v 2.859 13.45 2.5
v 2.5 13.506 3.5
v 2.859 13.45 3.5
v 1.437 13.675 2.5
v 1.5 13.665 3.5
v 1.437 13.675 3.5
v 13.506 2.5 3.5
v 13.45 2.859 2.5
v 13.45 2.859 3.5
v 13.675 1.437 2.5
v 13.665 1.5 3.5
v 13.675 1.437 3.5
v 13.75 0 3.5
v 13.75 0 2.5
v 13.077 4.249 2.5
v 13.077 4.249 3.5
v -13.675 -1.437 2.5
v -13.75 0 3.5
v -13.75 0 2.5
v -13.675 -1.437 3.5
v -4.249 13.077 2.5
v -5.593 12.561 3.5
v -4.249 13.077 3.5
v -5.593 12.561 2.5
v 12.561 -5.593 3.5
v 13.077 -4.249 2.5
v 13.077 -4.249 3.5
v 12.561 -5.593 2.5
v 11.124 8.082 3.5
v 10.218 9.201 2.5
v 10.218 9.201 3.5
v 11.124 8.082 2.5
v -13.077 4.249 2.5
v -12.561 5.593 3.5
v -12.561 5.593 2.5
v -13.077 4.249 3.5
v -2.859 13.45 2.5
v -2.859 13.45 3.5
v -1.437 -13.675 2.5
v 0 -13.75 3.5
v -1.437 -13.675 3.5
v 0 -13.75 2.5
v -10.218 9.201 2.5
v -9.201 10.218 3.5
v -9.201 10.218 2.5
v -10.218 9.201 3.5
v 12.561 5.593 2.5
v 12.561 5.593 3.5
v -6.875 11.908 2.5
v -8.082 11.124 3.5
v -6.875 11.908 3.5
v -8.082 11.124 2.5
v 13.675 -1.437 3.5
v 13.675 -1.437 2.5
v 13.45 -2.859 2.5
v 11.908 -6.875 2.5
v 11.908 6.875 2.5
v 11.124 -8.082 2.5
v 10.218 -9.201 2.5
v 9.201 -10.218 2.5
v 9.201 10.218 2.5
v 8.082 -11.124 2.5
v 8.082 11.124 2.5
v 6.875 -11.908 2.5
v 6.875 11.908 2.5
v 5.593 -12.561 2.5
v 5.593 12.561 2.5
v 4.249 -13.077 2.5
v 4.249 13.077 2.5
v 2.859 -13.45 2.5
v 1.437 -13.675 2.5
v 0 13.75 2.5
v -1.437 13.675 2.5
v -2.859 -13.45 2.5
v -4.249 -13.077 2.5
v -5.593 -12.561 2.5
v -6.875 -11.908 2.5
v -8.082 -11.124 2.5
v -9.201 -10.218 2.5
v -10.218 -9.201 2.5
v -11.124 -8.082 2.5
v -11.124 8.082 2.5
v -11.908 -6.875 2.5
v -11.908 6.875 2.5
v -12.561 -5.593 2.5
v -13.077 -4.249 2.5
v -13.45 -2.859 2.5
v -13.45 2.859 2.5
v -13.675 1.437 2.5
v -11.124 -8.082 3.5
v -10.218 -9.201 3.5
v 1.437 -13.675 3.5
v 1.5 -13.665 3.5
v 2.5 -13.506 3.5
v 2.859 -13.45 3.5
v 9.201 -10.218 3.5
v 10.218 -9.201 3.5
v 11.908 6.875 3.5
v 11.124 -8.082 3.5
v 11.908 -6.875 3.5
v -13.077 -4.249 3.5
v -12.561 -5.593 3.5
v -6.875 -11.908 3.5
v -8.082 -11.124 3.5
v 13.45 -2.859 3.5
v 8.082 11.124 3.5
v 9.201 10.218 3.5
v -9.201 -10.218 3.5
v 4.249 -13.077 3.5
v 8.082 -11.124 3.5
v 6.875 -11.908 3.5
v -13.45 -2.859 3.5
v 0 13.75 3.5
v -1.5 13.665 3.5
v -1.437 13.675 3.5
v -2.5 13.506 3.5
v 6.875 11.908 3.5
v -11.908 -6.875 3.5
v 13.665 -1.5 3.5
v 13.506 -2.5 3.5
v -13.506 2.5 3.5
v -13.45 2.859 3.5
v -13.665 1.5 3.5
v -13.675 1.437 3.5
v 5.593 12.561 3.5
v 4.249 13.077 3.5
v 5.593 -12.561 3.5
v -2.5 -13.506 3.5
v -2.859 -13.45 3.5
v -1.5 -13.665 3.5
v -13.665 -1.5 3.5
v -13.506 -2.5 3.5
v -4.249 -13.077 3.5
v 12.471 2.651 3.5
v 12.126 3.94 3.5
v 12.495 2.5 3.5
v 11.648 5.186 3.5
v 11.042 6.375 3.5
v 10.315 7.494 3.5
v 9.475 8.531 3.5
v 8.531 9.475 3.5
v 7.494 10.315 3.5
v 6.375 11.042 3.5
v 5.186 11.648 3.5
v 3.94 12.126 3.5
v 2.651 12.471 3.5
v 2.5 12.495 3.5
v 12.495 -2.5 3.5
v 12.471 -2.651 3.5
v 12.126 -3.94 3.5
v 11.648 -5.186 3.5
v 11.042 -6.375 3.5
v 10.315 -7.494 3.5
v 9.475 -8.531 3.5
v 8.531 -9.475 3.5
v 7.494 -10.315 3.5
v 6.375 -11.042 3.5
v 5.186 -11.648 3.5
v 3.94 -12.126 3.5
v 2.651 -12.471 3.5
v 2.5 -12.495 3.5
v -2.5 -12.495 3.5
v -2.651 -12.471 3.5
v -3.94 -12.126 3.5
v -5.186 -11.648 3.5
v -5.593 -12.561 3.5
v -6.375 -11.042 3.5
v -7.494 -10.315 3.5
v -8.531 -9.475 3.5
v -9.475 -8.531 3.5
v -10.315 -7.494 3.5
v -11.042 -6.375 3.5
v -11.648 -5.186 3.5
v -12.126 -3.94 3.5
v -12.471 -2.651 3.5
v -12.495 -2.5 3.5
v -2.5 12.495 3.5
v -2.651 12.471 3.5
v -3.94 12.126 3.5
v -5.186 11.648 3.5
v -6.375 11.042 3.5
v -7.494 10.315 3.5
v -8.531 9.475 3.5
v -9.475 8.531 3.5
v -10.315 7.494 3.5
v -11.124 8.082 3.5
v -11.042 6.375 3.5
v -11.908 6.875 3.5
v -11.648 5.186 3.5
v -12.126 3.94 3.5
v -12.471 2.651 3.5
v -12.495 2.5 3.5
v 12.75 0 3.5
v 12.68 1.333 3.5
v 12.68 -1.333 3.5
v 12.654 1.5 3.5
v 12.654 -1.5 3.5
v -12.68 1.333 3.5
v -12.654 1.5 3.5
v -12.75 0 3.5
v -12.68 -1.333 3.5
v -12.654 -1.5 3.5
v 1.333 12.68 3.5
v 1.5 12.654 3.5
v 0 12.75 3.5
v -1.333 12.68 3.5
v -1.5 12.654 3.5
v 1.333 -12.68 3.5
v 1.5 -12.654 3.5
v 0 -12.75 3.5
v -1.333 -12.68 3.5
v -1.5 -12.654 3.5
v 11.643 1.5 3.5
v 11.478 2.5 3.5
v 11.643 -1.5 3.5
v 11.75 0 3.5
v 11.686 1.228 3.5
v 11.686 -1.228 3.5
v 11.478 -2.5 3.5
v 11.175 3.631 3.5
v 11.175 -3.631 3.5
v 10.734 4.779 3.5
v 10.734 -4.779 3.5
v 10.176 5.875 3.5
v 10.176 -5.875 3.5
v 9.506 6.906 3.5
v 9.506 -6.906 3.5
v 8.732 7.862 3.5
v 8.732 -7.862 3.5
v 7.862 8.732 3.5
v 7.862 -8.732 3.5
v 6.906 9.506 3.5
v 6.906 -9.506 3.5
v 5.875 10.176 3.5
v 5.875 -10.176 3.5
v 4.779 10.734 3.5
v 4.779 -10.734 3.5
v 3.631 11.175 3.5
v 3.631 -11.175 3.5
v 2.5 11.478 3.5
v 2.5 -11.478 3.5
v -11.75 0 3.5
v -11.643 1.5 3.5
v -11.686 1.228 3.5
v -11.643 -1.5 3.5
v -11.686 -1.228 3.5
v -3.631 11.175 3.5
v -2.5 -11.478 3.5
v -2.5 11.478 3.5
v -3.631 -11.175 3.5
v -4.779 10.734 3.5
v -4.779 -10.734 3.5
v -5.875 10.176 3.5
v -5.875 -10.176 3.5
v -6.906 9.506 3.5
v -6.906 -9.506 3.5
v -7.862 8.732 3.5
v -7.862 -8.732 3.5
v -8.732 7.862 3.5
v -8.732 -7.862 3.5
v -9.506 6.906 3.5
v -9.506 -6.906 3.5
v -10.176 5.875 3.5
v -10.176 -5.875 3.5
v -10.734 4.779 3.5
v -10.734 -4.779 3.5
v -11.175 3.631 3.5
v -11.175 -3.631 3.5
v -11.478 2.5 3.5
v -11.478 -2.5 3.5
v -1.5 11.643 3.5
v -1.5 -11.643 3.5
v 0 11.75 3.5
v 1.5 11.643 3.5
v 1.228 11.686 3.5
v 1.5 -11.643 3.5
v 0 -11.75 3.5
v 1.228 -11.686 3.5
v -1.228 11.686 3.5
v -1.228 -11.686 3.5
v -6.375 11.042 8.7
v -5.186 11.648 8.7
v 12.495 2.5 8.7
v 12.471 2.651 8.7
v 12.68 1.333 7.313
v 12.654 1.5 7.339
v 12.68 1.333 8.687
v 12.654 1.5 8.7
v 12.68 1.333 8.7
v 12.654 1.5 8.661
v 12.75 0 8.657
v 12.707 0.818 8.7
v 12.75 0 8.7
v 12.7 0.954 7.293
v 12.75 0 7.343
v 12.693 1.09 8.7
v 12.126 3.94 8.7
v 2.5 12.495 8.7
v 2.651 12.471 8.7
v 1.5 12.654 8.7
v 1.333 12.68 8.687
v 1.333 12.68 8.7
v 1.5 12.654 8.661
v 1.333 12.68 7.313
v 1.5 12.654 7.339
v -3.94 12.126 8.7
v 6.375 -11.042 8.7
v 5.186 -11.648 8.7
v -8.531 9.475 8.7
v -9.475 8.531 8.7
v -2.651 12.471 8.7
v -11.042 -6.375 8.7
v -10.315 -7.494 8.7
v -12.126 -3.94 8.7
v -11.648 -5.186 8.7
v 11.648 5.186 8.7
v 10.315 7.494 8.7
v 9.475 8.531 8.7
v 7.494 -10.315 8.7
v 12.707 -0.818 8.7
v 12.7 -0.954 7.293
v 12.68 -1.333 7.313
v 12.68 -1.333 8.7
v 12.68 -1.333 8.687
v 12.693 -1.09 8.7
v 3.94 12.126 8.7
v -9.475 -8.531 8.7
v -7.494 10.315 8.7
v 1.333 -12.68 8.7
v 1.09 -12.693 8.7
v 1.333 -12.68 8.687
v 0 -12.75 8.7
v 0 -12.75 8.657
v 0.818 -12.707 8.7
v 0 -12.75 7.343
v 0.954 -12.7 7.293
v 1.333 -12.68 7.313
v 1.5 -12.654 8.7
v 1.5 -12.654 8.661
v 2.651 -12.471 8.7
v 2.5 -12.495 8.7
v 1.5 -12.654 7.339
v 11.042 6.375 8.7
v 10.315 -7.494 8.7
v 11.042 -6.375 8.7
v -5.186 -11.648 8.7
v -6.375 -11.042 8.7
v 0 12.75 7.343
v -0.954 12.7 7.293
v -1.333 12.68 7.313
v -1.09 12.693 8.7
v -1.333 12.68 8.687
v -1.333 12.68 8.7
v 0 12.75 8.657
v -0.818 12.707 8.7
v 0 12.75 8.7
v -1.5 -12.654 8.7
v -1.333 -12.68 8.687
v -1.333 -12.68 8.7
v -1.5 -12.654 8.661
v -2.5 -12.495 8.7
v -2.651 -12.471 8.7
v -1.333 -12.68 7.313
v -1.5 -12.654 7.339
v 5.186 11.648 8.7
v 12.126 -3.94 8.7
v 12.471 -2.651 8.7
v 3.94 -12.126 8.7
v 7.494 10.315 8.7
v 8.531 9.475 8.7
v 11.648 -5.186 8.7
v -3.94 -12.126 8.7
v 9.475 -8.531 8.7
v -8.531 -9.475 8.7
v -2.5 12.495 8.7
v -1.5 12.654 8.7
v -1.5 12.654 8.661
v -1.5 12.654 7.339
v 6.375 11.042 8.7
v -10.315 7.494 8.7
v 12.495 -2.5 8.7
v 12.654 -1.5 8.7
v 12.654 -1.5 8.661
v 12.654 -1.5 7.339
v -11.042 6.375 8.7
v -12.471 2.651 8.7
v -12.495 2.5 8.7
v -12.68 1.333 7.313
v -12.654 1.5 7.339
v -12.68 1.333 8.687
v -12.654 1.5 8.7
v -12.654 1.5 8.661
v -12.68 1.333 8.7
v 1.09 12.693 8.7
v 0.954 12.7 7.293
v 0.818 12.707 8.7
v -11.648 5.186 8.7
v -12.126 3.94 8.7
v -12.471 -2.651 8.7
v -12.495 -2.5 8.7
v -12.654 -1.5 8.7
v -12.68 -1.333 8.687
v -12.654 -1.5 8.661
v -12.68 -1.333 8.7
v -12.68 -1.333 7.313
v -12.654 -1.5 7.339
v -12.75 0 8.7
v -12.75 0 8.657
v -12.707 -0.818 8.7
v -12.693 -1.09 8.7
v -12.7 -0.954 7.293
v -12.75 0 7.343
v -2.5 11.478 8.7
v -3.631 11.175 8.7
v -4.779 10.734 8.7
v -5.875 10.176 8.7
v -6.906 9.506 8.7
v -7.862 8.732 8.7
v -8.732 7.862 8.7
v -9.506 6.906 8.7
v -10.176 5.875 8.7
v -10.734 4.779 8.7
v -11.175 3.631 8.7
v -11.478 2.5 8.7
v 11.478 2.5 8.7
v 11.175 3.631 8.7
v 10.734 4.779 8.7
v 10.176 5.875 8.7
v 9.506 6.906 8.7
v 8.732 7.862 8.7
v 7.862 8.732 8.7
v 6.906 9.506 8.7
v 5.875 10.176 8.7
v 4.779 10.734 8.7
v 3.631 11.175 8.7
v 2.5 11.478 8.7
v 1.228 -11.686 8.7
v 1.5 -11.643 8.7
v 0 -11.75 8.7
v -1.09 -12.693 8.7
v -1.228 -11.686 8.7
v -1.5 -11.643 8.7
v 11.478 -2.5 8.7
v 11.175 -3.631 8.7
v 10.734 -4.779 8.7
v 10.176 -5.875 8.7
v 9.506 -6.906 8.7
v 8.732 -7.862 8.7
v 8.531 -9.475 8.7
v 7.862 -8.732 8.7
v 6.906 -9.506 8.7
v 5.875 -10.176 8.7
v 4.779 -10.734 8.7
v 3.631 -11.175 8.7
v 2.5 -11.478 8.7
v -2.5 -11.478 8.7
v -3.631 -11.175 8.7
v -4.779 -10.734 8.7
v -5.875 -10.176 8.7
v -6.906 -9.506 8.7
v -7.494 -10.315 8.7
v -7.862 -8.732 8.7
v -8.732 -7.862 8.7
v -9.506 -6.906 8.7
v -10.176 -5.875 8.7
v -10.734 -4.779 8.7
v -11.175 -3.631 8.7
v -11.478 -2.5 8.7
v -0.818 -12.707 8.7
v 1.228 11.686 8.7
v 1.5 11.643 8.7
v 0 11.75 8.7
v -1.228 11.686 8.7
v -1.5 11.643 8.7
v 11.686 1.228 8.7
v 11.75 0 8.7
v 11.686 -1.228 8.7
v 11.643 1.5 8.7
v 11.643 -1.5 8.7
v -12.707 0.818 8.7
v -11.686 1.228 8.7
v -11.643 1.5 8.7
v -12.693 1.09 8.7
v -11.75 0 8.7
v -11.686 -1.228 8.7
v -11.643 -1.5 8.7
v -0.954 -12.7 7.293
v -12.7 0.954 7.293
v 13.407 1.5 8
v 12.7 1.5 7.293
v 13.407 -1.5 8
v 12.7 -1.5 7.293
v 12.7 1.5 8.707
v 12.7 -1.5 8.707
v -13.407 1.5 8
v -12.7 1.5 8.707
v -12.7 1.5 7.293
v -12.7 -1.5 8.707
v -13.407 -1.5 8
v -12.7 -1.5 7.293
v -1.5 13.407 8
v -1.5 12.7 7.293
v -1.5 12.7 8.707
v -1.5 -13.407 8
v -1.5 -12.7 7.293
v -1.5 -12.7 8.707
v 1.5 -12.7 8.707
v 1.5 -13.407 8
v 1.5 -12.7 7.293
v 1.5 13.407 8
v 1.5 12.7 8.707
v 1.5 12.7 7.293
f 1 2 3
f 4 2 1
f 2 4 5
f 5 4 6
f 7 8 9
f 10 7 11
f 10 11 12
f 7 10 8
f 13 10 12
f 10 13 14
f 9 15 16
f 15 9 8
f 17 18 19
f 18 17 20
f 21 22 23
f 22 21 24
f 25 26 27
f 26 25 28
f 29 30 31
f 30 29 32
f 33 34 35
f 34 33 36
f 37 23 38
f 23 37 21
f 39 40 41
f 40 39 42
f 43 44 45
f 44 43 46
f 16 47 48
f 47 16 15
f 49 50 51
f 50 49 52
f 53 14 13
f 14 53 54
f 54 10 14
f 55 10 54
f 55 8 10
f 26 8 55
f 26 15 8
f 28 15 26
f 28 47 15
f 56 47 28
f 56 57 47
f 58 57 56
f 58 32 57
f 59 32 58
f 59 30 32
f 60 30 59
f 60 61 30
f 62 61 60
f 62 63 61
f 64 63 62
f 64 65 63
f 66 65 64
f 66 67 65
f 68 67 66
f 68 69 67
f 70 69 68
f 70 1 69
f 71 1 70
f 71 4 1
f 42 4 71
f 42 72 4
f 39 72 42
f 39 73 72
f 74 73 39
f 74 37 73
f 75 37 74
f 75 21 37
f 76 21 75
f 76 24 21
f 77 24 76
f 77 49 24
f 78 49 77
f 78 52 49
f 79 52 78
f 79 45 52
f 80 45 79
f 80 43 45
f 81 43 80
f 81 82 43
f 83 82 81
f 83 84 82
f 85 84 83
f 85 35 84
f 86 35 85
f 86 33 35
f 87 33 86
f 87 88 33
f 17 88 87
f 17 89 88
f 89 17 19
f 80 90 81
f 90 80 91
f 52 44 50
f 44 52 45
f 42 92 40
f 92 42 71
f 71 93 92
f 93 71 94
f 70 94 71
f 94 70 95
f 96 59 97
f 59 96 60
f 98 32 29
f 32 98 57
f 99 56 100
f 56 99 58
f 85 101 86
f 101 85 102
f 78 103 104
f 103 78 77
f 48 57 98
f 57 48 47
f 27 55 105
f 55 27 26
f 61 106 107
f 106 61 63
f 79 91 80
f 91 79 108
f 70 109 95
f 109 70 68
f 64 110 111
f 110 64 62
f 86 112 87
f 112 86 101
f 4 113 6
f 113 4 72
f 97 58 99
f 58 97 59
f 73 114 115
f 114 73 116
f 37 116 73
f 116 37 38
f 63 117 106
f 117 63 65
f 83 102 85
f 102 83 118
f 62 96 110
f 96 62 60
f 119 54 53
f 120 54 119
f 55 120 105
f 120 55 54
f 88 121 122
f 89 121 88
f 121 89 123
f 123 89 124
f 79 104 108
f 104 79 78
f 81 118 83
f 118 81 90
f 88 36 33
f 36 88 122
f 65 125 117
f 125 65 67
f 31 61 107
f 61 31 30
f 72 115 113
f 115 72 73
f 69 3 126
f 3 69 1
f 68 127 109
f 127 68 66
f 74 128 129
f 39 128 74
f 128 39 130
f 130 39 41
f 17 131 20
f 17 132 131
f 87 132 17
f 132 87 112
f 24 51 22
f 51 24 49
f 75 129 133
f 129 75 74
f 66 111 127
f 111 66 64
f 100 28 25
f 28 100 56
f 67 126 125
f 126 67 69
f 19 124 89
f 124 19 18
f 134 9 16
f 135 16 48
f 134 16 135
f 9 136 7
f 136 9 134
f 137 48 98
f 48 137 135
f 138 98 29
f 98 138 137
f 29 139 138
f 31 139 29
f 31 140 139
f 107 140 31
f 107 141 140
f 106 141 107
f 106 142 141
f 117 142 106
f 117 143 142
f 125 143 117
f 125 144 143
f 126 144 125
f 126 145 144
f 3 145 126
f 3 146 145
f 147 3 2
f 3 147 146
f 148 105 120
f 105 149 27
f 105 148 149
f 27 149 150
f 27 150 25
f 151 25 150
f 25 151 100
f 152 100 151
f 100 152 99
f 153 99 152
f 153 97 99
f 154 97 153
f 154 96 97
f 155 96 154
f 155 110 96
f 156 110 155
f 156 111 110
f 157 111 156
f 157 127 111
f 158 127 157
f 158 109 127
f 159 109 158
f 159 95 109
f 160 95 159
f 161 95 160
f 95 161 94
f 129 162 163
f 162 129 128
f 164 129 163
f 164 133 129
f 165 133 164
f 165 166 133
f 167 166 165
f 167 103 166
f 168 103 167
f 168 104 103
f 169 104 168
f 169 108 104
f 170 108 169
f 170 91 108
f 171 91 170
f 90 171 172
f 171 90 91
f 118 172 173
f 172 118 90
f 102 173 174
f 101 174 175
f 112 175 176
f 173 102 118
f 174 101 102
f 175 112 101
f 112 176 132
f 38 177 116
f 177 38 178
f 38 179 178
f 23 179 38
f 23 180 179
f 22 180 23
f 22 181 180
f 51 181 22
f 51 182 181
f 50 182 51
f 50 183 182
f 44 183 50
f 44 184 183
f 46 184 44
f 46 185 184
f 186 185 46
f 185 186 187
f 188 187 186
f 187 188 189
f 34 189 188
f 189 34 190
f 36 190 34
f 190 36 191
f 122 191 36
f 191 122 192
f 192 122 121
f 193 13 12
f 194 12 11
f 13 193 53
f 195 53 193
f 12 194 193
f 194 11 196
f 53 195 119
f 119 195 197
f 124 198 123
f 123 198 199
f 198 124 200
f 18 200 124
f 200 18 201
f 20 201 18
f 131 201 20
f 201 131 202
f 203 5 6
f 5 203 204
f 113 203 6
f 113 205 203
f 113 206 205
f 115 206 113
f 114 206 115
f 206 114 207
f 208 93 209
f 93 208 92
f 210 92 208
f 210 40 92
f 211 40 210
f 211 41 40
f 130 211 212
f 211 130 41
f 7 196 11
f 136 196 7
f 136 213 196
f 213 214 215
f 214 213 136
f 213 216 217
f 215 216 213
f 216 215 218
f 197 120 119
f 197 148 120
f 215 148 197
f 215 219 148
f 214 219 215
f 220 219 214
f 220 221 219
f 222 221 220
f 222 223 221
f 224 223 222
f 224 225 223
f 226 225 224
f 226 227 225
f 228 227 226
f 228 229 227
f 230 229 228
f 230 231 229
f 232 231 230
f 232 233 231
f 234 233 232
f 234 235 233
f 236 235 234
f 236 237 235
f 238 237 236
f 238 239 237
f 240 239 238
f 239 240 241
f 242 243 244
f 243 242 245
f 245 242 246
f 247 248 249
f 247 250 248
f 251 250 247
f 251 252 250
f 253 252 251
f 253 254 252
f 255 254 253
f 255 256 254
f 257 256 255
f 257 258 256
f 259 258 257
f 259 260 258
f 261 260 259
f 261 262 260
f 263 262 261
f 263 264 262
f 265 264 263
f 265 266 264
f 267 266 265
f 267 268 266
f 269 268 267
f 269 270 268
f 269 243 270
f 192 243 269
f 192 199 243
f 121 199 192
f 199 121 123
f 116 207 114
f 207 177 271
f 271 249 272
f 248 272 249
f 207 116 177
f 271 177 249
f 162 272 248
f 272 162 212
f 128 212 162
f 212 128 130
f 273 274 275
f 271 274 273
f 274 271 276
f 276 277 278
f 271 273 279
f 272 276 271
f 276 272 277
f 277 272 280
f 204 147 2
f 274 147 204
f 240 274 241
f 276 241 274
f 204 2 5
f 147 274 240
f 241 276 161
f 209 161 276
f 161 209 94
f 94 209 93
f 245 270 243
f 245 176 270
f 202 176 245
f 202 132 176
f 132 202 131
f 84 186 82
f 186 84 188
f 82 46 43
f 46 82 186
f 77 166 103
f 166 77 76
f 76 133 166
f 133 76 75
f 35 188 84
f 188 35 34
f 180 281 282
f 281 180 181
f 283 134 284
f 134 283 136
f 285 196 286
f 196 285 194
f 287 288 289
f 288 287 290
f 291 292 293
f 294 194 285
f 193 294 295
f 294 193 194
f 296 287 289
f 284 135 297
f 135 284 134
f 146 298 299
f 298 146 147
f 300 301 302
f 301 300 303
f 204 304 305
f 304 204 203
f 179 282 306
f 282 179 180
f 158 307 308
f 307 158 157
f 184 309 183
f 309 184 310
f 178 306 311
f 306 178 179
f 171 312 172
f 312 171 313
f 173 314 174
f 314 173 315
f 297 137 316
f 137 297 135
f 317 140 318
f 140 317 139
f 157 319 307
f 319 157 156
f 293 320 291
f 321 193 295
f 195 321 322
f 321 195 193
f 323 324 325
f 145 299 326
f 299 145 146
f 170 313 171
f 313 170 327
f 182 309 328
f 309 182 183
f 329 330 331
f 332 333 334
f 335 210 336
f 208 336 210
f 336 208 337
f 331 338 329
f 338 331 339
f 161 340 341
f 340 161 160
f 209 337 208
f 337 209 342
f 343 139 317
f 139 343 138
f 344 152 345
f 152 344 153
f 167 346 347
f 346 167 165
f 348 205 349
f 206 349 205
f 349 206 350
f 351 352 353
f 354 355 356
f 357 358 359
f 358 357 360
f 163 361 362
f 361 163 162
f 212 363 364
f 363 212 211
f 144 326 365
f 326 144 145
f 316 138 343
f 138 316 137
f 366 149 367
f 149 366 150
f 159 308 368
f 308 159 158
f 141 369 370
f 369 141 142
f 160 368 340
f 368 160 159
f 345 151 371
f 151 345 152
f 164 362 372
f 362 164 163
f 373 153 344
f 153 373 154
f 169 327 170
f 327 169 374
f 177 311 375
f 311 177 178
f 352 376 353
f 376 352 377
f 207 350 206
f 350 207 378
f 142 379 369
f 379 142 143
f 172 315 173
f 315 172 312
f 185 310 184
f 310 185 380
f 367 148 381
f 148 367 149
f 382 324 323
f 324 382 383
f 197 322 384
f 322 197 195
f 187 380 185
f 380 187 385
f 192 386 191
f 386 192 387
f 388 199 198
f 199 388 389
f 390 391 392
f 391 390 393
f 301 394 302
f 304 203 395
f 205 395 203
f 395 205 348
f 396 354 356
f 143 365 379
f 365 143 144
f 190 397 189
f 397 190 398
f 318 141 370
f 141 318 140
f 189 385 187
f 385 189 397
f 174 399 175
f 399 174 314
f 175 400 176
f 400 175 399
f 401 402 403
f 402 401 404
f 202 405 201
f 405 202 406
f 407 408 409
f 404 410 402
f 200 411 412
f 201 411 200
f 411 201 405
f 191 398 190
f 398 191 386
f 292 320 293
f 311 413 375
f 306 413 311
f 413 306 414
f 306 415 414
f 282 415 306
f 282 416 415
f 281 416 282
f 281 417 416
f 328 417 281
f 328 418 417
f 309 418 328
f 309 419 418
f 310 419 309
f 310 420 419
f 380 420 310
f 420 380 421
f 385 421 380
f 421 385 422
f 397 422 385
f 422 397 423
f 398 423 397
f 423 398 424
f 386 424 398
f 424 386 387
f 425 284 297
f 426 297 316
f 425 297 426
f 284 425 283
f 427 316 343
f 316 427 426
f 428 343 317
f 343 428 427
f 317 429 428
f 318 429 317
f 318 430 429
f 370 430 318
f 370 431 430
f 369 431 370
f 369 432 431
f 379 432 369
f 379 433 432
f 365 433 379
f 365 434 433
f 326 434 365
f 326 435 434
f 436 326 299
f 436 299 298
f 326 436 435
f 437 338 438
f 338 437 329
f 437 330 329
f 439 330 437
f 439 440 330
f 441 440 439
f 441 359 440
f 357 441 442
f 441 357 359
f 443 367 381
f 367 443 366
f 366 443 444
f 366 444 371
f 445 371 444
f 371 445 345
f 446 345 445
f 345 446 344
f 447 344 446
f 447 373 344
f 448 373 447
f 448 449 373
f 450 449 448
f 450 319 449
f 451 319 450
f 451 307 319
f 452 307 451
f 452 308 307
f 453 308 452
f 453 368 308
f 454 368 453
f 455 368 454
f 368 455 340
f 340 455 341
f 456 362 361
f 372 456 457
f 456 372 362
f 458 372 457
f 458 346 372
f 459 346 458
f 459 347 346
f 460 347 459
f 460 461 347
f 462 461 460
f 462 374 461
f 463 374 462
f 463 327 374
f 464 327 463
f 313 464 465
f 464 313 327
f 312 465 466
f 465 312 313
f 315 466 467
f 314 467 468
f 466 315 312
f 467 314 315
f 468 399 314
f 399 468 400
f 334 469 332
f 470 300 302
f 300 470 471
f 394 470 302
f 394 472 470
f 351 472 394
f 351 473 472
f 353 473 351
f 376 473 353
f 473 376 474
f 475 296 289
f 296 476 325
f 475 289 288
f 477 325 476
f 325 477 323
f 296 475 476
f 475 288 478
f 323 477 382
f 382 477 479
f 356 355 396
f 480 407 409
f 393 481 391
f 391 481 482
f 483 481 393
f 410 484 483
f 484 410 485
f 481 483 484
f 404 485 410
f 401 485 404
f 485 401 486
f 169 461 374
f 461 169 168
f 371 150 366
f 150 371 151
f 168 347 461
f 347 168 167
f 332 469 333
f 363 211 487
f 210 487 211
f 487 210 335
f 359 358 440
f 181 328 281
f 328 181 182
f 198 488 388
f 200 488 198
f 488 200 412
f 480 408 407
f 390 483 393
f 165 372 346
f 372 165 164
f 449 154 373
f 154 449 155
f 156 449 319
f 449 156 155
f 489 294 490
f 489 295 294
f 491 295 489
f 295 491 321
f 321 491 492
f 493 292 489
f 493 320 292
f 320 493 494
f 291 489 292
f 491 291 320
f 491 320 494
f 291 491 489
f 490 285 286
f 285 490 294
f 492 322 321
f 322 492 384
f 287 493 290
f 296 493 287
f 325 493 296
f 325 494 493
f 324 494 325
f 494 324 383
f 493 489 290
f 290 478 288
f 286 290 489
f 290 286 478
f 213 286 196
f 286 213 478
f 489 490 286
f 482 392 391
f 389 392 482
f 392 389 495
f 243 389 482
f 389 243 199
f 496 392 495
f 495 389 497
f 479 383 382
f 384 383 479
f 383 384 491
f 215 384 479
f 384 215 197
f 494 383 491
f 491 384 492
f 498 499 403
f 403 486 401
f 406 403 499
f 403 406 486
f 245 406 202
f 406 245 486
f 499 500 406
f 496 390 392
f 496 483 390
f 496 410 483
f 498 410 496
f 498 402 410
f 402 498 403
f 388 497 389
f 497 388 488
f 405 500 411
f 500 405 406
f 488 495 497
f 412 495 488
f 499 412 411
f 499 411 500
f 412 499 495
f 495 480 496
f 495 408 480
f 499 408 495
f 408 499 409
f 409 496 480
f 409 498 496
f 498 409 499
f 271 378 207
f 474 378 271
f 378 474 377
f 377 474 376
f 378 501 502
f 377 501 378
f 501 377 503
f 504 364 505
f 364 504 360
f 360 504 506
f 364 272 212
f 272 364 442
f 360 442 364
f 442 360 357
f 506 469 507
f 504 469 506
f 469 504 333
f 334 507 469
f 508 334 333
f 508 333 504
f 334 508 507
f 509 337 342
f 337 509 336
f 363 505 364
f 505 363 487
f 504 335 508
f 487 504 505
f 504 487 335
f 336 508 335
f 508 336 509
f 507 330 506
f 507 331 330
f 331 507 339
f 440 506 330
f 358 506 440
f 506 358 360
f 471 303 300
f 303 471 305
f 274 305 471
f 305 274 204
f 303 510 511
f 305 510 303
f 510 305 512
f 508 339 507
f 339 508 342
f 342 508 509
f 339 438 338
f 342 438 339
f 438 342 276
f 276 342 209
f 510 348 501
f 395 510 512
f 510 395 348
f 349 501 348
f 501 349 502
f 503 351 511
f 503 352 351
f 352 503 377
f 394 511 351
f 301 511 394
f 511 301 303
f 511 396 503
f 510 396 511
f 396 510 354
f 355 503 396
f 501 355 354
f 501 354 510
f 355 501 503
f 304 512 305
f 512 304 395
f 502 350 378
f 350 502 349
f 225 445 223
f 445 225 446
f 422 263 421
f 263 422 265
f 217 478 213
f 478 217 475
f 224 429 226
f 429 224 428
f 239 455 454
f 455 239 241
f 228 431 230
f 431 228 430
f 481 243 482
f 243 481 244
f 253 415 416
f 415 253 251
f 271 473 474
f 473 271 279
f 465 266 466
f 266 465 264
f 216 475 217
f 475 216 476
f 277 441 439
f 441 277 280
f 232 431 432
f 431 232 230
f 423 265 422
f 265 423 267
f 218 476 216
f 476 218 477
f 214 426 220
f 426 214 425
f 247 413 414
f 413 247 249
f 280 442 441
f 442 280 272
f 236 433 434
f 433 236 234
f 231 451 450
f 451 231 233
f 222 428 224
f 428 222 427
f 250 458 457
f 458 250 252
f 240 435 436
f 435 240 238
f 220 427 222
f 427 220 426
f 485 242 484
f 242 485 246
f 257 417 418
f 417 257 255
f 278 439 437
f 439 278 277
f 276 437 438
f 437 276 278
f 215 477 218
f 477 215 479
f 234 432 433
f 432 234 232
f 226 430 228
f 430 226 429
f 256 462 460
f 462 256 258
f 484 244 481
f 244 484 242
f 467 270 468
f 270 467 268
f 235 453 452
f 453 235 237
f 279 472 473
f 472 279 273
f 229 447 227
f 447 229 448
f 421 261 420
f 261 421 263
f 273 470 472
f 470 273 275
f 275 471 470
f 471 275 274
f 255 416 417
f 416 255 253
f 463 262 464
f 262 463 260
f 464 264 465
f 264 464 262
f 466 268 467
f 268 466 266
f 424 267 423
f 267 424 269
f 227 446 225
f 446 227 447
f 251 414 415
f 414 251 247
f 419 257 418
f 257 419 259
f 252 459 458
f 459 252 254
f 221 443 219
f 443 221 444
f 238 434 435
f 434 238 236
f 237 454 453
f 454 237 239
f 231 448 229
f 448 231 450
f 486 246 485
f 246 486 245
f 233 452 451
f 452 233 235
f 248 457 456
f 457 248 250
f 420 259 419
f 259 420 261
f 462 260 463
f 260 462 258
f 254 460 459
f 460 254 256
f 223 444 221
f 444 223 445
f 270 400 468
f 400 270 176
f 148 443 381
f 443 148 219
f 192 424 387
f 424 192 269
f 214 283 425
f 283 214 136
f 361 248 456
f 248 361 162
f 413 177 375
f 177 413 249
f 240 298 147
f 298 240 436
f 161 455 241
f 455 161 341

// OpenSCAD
$fn = 60;

difference() {
	union() {
*cube(center = true,
	[
		30,	
		30,
		5
	]
);
translate([0,0,2.5])
	cylinder(
		r = 25.5/2+1,
		h = 1
	);
translate([0,0,3.5])
	cylinder(
		r = 25.5/2,
		h = 5.2
	);
	translate([25.4/2,0,8])
	rotate([0,45,0,])
	cube(center = true,
		[
			1,
			3,
			1
		]
	);
translate([-25.4/2,0,8])
	rotate([0,45,0,])
	cube(center = true,
		[
			1,
			3,
			1
		]
	);
translate([0,-25.4/2,8])
	rotate([45,0,0,])
	cube(center = true,
		[
			3,
			1,
			1
		]
	);
translate([0,25.4/2,8])
	rotate([45,0,0,])
	cube(center = true,
		[
			3,
			1,
			1
		]
	);
}
	translate([0,0,2.5+1])
	cylinder(
		r = 25.5/2-1,
		h = 10
	);
	translate([0,-2,8.5])
	cube(center = true,
		[
			1000,
			1,
			10
		]
	);
	translate([0,2,8.5])
	cube(center = true,
		[
			1000,
			1,
			10
		]
	);
	translate([-2,0,8.5])
	cube(center = true,
		[
			1,
			1000,
			10
		]
	);
	translate([2,0,8.5])
	cube(center = true,
		[
			1,
			1000,
			10
		]
	);
}
